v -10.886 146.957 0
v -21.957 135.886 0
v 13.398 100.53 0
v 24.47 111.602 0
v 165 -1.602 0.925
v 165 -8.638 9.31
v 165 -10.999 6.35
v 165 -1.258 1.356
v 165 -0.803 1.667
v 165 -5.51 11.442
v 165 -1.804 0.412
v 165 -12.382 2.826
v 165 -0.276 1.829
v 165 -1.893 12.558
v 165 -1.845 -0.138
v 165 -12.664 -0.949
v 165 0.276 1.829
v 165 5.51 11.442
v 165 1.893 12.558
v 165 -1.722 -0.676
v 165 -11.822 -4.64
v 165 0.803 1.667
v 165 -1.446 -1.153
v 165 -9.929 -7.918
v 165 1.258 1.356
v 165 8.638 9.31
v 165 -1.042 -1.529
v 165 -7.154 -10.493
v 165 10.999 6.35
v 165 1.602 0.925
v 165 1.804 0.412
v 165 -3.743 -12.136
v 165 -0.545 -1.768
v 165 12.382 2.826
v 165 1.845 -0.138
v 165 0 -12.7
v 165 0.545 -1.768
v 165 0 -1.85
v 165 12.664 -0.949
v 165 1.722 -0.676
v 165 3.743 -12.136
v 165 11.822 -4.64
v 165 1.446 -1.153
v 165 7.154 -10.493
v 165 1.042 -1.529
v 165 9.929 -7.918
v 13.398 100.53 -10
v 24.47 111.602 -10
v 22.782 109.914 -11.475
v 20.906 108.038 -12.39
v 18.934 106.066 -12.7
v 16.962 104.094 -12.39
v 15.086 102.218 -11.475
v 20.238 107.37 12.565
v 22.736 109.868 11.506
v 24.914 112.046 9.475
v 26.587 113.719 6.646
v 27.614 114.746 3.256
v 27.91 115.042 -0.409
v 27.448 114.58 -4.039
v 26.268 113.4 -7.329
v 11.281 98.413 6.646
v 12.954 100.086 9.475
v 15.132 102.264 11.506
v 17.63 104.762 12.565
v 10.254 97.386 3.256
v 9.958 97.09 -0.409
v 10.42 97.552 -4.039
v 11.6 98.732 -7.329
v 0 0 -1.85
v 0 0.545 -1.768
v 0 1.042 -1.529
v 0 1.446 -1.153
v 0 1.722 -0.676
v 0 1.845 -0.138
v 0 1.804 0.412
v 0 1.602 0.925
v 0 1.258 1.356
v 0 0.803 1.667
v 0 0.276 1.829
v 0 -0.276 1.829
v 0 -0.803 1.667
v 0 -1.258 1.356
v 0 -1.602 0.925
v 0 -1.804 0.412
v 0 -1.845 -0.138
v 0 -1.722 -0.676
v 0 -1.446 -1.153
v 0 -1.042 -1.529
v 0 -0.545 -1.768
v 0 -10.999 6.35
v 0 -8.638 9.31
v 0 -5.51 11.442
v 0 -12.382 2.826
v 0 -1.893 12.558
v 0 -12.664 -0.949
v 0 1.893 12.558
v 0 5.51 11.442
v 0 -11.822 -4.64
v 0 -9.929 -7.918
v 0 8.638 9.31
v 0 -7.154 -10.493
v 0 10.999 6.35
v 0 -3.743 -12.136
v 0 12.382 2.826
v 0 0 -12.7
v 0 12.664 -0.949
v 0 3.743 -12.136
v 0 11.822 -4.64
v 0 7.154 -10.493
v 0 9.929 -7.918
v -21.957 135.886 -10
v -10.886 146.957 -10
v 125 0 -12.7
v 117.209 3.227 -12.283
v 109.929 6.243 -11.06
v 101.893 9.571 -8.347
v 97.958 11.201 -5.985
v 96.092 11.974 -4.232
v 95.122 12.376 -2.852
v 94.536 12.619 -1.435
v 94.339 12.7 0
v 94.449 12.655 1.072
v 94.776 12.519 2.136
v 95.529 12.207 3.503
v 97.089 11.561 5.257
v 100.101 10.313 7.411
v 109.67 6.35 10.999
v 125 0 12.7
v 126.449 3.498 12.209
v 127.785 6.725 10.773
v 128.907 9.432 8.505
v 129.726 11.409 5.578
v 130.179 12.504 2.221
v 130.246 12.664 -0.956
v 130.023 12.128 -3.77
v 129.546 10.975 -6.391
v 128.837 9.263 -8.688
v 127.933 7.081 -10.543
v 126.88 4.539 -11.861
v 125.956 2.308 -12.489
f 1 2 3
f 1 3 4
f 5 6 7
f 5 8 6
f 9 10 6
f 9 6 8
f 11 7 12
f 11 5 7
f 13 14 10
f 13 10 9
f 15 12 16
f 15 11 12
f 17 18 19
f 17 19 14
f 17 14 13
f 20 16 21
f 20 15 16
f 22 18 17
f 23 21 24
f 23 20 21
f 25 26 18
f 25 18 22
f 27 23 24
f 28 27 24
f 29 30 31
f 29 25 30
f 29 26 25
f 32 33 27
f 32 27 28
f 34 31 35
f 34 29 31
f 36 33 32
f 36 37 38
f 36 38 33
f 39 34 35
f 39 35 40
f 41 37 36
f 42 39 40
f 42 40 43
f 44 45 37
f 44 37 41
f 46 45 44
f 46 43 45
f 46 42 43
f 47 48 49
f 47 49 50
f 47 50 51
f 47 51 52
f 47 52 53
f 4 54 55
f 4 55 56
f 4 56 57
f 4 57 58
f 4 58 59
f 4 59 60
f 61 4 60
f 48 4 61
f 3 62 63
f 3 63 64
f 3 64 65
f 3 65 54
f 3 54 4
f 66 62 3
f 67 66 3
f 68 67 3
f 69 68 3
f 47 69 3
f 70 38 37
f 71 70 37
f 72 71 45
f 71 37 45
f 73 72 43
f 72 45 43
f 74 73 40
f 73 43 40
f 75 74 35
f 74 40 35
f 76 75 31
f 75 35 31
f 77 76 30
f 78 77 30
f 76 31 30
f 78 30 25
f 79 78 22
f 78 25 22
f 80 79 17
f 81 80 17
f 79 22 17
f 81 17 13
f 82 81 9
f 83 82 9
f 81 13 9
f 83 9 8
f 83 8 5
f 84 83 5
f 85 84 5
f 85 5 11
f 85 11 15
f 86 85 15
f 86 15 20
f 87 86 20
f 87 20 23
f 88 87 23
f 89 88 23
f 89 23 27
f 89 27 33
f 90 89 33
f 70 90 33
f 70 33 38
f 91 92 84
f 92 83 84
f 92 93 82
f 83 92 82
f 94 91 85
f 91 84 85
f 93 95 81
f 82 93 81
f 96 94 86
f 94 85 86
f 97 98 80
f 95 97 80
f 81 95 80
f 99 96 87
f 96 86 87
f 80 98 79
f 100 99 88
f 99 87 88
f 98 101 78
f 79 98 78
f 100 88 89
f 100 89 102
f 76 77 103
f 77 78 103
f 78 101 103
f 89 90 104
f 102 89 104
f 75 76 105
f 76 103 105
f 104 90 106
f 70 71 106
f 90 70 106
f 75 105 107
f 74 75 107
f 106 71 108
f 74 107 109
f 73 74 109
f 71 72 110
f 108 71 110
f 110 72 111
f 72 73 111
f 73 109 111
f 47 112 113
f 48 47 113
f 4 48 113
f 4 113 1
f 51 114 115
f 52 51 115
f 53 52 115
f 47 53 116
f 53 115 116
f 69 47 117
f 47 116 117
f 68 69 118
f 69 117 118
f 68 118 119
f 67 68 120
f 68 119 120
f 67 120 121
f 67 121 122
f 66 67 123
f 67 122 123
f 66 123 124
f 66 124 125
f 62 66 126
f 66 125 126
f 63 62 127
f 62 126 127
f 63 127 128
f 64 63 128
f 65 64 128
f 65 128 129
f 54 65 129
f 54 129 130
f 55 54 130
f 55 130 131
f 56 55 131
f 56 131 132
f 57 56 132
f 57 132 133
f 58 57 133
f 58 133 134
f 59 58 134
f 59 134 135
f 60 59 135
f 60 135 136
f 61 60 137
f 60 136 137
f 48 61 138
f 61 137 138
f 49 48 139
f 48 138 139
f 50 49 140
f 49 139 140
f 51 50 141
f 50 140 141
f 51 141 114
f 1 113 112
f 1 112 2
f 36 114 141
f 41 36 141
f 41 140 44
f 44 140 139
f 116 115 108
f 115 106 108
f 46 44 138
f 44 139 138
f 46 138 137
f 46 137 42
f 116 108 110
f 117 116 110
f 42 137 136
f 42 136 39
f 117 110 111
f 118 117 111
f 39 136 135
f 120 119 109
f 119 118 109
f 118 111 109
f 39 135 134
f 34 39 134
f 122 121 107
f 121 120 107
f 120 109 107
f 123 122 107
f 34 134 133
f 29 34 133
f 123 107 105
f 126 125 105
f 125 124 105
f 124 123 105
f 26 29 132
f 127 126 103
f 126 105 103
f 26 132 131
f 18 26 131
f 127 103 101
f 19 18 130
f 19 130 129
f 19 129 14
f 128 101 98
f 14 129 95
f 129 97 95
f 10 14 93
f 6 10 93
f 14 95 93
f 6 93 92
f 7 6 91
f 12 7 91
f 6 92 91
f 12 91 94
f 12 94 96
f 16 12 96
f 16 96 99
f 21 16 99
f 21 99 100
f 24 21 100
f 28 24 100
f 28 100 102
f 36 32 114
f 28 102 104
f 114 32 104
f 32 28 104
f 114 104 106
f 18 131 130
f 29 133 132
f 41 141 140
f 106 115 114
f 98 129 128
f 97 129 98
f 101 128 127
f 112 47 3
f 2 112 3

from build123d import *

# Parameters (mm, degrees)
SKETCH1_R           = 12.7
BOSS_EXTRUDE1_DEPTH = 165
SKETCH7_R           = 12.7
BOSS_EXTRUDE3_DEPTH = 150
SKETCH10_W          = 10
SKETCH10_H          = 15.657586021
BOSS_EXTRUDE8_DEPTH = 50
SKETCH11_R          = 1.85
CUT_EXTRUDE2_DEPTH  = 239.140019974


with BuildPart() as part:
    # Sketch1 → Boss-Extrude1 (new body)
    with BuildSketch(Plane(origin=(0, 0, 0), x_dir=(0, 0, -1), z_dir=(1, 0, 0))):
        Circle(SKETCH1_R)
    extrude(amount=BOSS_EXTRUDE1_DEPTH)

    # Sketch7 → Boss-Extrude3 (add)
    with BuildSketch(Plane(origin=(62.5, -62.5, 0), x_dir=(0.7071067811865464, 0.7071067811865488, 0), z_dir=(-0.7071067811865488, 0.7071067811865464, 0))):
        with Locations(Location((88.388347648, 0, 0), (0, 0, 90))):
            Circle(SKETCH7_R)
    extrude(amount=BOSS_EXTRUDE3_DEPTH)

    # Sketch10 → Boss-Extrude8 (add)
    with BuildSketch(Plane(origin=(-43.566017178, 43.566017178, 0), x_dir=(0, 0, 1), z_dir=(-0.7071067811865487, 0.7071067811865465, 0))):
        with Locations((-5, 88.388347649)):
            Rectangle(SKETCH10_W, SKETCH10_H)
    extrude(amount=BOSS_EXTRUDE8_DEPTH)

    # Sketch11 → Cut-Extrude2 (cut, through all)
    with BuildSketch(Plane(origin=(165, 0, 0), x_dir=(0, 0, -1), z_dir=(1, 0, 0))):
        Circle(SKETCH11_R)
    extrude(amount=-CUT_EXTRUDE2_DEPTH, mode=Mode.SUBTRACT)


solid = part.part
